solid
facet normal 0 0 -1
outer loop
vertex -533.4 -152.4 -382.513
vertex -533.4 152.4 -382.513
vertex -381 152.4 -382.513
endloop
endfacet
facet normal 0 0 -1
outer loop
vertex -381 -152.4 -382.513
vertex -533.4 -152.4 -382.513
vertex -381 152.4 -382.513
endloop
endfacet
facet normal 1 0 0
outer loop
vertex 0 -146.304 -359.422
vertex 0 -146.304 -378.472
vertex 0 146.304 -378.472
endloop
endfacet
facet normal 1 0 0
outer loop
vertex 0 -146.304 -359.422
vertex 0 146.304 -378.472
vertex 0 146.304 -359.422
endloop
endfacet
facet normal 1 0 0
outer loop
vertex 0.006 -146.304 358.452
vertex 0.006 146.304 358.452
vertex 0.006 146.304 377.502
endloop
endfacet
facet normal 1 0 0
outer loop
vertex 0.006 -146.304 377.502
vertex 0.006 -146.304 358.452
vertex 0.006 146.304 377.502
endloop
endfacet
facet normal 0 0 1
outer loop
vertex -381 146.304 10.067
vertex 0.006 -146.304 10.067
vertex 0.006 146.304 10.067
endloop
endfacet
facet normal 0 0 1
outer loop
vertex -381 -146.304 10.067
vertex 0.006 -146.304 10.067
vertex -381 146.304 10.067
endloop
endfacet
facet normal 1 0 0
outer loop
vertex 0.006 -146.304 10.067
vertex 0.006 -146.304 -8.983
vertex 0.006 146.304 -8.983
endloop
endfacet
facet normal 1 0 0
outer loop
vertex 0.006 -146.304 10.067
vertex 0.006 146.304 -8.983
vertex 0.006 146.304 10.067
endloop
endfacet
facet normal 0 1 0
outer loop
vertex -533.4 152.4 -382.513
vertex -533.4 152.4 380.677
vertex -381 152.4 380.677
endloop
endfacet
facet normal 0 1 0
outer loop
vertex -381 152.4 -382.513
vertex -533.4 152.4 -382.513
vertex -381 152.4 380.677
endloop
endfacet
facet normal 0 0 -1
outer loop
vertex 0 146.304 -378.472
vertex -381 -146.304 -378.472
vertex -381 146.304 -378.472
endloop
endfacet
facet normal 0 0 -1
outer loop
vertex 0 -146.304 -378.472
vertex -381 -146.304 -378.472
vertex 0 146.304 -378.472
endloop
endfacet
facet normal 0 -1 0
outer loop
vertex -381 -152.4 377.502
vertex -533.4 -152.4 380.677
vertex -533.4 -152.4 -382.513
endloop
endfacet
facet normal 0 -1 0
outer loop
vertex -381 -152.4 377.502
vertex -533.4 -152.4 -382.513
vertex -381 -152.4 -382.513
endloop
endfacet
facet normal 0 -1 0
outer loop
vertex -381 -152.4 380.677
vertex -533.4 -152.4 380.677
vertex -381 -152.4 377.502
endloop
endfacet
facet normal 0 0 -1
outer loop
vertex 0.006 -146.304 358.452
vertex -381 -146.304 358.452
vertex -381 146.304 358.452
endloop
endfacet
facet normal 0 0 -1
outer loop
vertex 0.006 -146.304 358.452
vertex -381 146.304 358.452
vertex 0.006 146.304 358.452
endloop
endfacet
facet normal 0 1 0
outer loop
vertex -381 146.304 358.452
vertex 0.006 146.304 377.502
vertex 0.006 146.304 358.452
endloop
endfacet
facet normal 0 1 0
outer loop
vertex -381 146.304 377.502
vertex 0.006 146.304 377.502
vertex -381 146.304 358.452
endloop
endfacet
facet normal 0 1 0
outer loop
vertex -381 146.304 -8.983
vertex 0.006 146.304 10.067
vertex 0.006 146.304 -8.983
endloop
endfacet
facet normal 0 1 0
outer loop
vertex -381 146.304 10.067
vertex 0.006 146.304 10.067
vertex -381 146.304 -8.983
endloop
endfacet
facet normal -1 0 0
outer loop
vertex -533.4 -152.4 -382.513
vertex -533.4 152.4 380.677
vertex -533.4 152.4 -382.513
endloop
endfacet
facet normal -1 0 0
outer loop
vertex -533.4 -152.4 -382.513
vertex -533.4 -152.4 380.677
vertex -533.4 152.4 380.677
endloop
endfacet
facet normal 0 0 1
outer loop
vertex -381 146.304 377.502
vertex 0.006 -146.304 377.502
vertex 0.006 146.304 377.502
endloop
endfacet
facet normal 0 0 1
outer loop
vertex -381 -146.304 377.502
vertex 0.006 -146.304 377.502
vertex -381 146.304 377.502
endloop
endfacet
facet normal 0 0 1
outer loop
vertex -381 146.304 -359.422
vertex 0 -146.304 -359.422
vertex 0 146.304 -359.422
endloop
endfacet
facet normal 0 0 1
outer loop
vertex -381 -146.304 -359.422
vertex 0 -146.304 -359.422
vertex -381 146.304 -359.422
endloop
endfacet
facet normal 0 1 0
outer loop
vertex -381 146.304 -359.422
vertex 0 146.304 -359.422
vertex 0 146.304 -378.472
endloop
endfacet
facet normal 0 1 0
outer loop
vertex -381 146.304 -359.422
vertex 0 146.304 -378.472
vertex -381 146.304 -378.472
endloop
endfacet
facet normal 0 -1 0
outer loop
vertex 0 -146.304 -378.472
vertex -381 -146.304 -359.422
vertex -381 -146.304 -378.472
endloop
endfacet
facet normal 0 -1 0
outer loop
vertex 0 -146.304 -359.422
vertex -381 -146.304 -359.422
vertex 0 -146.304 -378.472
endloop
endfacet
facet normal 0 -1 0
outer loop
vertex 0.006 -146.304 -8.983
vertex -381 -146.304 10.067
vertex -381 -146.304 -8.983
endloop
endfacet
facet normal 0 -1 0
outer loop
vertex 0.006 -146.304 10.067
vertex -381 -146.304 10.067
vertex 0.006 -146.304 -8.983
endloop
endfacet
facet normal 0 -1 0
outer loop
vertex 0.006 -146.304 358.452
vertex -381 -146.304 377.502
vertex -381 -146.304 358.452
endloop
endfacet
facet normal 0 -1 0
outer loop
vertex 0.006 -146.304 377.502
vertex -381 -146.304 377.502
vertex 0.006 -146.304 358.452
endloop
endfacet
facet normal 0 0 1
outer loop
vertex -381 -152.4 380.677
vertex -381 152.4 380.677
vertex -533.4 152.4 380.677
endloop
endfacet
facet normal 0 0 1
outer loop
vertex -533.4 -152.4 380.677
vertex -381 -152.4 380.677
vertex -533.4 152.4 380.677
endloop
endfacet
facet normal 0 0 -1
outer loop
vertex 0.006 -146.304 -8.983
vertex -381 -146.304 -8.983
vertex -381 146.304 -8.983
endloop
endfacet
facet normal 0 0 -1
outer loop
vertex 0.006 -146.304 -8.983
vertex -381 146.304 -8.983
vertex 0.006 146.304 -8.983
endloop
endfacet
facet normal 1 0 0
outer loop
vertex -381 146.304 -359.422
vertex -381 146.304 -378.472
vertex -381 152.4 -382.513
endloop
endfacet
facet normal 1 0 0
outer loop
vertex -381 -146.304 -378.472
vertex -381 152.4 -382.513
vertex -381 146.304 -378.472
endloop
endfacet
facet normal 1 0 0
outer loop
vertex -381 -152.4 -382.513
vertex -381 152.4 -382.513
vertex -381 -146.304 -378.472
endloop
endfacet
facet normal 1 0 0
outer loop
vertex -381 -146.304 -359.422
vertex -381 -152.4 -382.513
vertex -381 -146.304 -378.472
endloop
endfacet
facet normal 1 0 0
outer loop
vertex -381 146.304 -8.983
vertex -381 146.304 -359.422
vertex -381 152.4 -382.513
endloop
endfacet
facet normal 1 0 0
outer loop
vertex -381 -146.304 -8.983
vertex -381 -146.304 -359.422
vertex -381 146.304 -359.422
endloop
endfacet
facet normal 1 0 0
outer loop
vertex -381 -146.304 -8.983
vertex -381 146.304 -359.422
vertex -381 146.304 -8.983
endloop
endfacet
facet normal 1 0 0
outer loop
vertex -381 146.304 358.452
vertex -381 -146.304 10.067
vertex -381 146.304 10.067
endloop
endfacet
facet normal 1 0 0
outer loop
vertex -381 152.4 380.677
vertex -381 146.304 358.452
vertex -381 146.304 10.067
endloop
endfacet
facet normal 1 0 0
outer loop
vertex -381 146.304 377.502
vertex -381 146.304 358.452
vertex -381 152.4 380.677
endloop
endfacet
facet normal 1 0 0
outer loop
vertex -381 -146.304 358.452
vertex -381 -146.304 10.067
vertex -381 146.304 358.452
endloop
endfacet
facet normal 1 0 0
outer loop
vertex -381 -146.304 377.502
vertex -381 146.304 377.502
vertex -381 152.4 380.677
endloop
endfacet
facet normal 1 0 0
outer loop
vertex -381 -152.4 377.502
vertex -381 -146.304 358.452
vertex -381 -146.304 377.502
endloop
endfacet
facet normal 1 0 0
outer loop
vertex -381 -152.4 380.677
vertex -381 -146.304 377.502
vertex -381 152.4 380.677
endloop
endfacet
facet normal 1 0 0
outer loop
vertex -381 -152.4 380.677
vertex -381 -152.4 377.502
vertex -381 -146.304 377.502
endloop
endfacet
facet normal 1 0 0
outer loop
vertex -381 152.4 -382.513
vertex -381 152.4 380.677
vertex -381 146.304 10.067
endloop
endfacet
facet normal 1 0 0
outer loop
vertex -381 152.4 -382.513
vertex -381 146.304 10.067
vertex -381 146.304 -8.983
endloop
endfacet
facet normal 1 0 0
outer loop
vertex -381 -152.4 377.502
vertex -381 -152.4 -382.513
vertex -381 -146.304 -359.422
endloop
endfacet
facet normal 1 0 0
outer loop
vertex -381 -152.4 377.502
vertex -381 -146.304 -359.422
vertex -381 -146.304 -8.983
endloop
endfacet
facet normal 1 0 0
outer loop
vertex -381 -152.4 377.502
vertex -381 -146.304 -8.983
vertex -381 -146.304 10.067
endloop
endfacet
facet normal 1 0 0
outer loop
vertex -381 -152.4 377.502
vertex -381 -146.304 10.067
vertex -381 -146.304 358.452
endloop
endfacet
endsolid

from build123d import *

# Parameters (mm, degrees)
F1_DEPTH      = 152.4
F1_DEPTH_BACK = 152.4
F2_W          = 381.0055409819
F2_H          = 19.05
F2_W_2        = 381
F3_DEPTH      = 6.096
F4_W          = 381.0055409819
F4_H          = 19.05
F4_W_2        = 381
F5_DEPTH      = 6.096


# Not quite as in the source:
# - ends of sketch curves that miss each other by under 0.0002 mm in the source are joined


with BuildPart() as f1:
    # F0 (on Front) → F1 (new body, two sides)
    with BuildSketch(Plane.XZ) as f1_sk:
        Polygon((-533.4, -382.5126007106), (-381, -382.5126007106), (-381, -378.4719215088), (0, -378.4719215088), (0, -359.4219215088), (-381, -359.4219215088), (-381, -356.2469204928), (-381, -12.157774965), (-381, -8.982775981), (0.0055409819, -8.982775981), (0.0055409819, 10.067224019), (-381, 10.067224019), (-381, 13.242225035), (-381, 355.2765448173), (-381, 358.4515458333), (0.0055409819, 358.4515458333), (0.0055409819, 377.5015458333), (-381, 377.5015458333), (-381, 380.6765448173), (-533.4, 380.6765468493), align=None)
    extrude(amount=F1_DEPTH)
    extrude(f1_sk.sketch, amount=-F1_DEPTH_BACK)

    # F2 (on face) → F3 (cut)
    with BuildSketch(Plane(origin=(0, 152.4, 0), x_dir=(-1, 0, 0), z_dir=(0, 1, 0))):
        with Locations((190.4972295091, 367.9765458333)):
            Rectangle(F2_W, F2_H)
        with Locations((190.4972295091, 0.542224019)):
            Rectangle(F2_W, F2_H)
        with Locations((190.5, -368.9469215088)):
            Rectangle(F2_W_2, F2_H)
    extrude(amount=-F3_DEPTH, mode=Mode.SUBTRACT)

    # F4 (on face) → F5 (cut)
    with BuildSketch(Plane.XZ.offset(152.4)):
        with Locations((-190.4972295091, 0.542224019)):
            Rectangle(F4_W, F4_H)
        with Locations((-190.4972295091, 367.9765458333)):
            Rectangle(F4_W, F4_H)
        with Locations((-190.5, -368.9469215088)):
            Rectangle(F4_W_2, F4_H)
    extrude(amount=-F5_DEPTH, mode=Mode.SUBTRACT)


solid = f1.part
